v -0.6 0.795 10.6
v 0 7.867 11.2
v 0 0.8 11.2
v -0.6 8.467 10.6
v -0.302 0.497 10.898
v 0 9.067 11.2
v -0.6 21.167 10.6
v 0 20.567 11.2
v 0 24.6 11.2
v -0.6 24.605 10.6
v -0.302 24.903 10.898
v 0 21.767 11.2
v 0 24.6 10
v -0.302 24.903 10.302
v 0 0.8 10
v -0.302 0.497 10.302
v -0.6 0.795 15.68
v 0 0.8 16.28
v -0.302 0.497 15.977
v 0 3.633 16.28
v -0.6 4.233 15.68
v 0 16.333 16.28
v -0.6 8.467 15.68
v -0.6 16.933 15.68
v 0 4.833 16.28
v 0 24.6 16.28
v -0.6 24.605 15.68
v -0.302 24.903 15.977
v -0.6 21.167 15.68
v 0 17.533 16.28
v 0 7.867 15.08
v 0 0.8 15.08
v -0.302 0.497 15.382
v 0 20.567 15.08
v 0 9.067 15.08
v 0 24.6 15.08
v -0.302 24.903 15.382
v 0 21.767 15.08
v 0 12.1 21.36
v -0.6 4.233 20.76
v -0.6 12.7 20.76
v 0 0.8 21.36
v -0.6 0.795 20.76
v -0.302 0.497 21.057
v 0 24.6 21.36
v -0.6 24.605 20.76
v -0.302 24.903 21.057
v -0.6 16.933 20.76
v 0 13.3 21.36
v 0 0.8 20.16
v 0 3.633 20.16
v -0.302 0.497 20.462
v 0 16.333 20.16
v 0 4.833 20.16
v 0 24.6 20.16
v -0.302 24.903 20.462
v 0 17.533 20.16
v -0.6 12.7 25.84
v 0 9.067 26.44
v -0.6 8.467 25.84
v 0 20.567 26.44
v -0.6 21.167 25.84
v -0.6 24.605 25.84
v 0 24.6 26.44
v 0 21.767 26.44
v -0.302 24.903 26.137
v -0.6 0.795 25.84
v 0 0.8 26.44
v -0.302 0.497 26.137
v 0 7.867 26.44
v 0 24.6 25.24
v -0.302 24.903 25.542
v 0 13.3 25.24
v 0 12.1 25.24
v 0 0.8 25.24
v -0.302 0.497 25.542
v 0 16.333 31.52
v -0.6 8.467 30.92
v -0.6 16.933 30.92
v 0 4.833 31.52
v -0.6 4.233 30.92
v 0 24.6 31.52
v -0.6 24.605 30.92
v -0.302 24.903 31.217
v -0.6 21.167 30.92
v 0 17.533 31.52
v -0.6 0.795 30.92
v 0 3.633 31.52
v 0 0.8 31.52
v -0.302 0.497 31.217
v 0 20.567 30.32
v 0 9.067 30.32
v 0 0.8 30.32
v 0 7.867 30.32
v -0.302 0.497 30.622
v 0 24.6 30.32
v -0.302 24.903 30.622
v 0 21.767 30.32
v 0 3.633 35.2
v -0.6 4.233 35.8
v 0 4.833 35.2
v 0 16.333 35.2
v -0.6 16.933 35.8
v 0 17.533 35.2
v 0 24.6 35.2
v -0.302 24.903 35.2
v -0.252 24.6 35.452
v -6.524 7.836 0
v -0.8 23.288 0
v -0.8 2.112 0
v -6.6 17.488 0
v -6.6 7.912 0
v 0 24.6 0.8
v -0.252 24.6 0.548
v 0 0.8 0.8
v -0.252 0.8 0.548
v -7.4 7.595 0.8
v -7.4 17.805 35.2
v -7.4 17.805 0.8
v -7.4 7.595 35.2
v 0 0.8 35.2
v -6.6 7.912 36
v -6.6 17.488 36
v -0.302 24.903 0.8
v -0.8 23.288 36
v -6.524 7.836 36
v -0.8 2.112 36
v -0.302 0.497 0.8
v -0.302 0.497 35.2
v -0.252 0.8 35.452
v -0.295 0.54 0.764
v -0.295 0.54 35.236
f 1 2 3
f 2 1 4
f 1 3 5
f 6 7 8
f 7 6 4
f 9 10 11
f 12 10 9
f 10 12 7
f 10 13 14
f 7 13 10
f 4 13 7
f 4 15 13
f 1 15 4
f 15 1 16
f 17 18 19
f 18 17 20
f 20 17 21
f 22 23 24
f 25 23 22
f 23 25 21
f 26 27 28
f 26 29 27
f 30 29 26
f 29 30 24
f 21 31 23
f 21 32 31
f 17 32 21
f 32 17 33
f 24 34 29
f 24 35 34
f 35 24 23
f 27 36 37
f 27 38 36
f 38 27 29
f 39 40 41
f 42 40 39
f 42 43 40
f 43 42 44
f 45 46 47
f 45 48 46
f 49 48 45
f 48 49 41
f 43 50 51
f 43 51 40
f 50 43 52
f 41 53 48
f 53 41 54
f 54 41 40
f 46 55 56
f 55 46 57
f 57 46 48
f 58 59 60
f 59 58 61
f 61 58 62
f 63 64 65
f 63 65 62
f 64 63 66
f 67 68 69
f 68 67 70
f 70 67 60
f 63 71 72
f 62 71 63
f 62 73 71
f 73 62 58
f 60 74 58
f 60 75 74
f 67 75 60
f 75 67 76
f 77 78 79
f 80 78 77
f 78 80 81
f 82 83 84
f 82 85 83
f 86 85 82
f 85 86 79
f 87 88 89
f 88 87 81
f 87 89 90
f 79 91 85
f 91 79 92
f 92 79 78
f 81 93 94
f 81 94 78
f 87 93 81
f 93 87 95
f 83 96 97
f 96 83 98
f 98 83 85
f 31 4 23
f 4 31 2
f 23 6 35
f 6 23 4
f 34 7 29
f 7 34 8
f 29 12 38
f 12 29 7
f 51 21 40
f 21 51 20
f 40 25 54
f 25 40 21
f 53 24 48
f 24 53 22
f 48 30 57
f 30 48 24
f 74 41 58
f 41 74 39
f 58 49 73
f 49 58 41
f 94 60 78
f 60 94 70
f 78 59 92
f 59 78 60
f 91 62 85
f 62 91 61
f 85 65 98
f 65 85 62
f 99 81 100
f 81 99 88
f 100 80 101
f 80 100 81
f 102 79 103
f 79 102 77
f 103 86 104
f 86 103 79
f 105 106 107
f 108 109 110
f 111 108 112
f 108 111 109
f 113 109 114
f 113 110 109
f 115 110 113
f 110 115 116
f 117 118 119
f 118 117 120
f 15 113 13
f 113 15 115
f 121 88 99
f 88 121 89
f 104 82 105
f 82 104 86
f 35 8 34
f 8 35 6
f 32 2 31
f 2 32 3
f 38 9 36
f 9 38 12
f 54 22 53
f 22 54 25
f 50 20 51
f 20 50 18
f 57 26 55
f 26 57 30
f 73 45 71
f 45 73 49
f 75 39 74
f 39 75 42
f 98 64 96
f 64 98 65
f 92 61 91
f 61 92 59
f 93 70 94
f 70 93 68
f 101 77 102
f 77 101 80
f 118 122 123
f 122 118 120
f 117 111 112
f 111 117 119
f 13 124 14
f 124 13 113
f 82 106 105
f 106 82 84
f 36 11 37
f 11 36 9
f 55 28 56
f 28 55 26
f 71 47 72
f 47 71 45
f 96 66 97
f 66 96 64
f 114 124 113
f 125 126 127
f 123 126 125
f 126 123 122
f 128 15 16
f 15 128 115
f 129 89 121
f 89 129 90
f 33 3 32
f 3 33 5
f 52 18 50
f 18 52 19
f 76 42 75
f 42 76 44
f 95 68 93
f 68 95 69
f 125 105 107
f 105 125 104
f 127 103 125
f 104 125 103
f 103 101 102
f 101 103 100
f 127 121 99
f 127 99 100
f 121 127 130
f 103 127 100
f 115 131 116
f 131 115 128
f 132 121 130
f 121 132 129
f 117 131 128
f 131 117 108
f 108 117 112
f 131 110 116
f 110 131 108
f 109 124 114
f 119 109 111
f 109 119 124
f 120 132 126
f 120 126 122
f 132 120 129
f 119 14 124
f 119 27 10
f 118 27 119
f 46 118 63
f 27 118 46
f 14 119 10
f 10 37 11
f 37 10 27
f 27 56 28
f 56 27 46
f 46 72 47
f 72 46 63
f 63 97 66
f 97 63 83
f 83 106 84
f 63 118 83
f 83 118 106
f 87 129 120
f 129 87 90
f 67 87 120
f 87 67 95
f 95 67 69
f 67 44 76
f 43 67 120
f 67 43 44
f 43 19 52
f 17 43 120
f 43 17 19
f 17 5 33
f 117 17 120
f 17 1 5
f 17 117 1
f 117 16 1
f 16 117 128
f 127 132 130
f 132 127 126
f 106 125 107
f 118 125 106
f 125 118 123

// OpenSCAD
include <libs.scad>;

//wall
*linear_wall(4);
*round_wall(2);
corner_wall(1);

module linear_wall_base(size)
{
    translate([-wall_width*basis/2,size*basis/2,wall_height/2])hull()
    {
        cube([wall_width*basis-bevel*2,size*basis,wall_height-bevel*2],center=true);
        cube([wall_width*basis-bevel*2,size*basis-bevel*2,wall_height],center=true);
        cube([wall_width*basis,size*basis-bevel*2,wall_height-bevel*2],center=true);
    }
}

module round_wall_base(size)
{
    difference()
    {
        hull()
        {
            translate([0,0,bevel])cylinder(r=size*basis+basis*wall_width,h=wall_height-bevel*2);
            cylinder(r=size*basis+basis*wall_width-bevel,h=wall_height);
        }
        cylinder(r=size*basis,h=wall_height);
        translate([0,0,-ep])cylinder(r1=size*basis+bevel,r2=size*basis,h=bevel);
        translate([0,0,wall_height-bevel+ep])cylinder(r2=size*basis+bevel,r1=size*basis,h=bevel);
    }
}

module linear_brick_grids(size)
{
    //one for each wall level, horizontal
    brick_h=(wall_height-floor_thick)/wall_layers;
    for (ii=[0:wall_layers-1])
    {
        translate([0,size*basis/2,floor_thick+ii*brick_h])rotate([0,45,0])cube([wall_groove*sqrt(2),size*basis*2,wall_groove*sqrt(2)],center=true);
    }
    //vertical
    //one above floor is off by half, then even, then off
    for (ii=[1:1:wall_layers])
    {
        for(jj=[0:.5:size+1])
        {
            translate([0,jj*basis-(ii%6)*basis/6,floor_thick+ii*brick_h-brick_h/2])rotate([0,0,45])cube([wall_groove*sqrt(2),wall_groove*sqrt(2),brick_h],center=true);
        }
    }
}

module round_brick_grids(size)
{
    brick_h=(wall_height-floor_thick)/wall_layers;
    //horizontal
    for (ii=[0:wall_layers-1])
    {
        translate([0,0,floor_thick+ii*brick_h])hull()
        {
            cylinder(r=basis*size+wall_groove,h=ep,center=true);
            cylinder(r=basis*size,h=wall_groove*2,center=true);
        }
    }
    //vertical
    //vertical should be shifted each layer
    for (ii=[1:1:wall_layers])
    {
        for(jj=[0:30/size:120])
        {
            rotate([0,0,jj+(ii%6)*(10/size)])translate([basis*size,0,floor_thick+ii*brick_h-brick_h/2])rotate([0,0,45])cube([wall_groove*sqrt(2),wall_groove*sqrt(2),brick_h],center=true);
        }
    }
}

module round_wall(size)
{
    xx=basis*size+basis*wall_width;
    yy=basis*size+basis*wall_width;
    zz=wall_height;
    difference()
    {
        intersection()
        {
            round_wall_base(size);
            translate([.5*(basis*size+basis*wall_width),.5*(basis*size+basis*wall_width),wall_height/2])hull()
            {
                cube([xx-bevel*2,yy,zz-bevel*2],center=true);
                cube([xx-bevel*2,yy-bevel*2,zz],center=true);
                cube([xx,yy-bevel*2,zz-bevel*2],center=true);
            }
        }
        hull()
        {
            cube([basis*size*2+bevel*2,ep,zz*3],center=true);
            cube([ep,basis*size*2+bevel*2,zz*3],center=true);
        }
        round_brick_grids(size);
    }
}

module linear_wall(size)
{
    difference()
    {
        linear_wall_base(size);
        linear_brick_grids(size);
        *translate([-wall_width*basis,0,0])linear_brick_grids(size);
    }
}

module corner_wall(size)
{
  intersection()
  {
    linear_wall(size);
    //45 degree slope so we can do inside corners
    translate([0,0,0])hull()
    {
      //beveling
      translate([0,0,-ep])linear_extrude(wall_height+ep*2)offset(delta=-bevel)hull()
      {
        translate([0,basis*0.5*size])square([ep,basis*size-wall_tol*2],center=true);
        translate([-wall_width*basis,basis*0.5*size])square([ep,basis*size-wall_tol*2-wall_width*2*basis],center=true);
      }
      translate([0,0,bevel])linear_extrude(wall_height-bevel*2)hull()
      {
        translate([0,basis*0.5*size])square([ep,basis*size-wall_tol*2],center=true);
        translate([-wall_width*basis,basis*0.5*size])square([ep,basis*size-wall_tol*2-wall_width*2*basis],center=true);
      }
    }
  }
}
